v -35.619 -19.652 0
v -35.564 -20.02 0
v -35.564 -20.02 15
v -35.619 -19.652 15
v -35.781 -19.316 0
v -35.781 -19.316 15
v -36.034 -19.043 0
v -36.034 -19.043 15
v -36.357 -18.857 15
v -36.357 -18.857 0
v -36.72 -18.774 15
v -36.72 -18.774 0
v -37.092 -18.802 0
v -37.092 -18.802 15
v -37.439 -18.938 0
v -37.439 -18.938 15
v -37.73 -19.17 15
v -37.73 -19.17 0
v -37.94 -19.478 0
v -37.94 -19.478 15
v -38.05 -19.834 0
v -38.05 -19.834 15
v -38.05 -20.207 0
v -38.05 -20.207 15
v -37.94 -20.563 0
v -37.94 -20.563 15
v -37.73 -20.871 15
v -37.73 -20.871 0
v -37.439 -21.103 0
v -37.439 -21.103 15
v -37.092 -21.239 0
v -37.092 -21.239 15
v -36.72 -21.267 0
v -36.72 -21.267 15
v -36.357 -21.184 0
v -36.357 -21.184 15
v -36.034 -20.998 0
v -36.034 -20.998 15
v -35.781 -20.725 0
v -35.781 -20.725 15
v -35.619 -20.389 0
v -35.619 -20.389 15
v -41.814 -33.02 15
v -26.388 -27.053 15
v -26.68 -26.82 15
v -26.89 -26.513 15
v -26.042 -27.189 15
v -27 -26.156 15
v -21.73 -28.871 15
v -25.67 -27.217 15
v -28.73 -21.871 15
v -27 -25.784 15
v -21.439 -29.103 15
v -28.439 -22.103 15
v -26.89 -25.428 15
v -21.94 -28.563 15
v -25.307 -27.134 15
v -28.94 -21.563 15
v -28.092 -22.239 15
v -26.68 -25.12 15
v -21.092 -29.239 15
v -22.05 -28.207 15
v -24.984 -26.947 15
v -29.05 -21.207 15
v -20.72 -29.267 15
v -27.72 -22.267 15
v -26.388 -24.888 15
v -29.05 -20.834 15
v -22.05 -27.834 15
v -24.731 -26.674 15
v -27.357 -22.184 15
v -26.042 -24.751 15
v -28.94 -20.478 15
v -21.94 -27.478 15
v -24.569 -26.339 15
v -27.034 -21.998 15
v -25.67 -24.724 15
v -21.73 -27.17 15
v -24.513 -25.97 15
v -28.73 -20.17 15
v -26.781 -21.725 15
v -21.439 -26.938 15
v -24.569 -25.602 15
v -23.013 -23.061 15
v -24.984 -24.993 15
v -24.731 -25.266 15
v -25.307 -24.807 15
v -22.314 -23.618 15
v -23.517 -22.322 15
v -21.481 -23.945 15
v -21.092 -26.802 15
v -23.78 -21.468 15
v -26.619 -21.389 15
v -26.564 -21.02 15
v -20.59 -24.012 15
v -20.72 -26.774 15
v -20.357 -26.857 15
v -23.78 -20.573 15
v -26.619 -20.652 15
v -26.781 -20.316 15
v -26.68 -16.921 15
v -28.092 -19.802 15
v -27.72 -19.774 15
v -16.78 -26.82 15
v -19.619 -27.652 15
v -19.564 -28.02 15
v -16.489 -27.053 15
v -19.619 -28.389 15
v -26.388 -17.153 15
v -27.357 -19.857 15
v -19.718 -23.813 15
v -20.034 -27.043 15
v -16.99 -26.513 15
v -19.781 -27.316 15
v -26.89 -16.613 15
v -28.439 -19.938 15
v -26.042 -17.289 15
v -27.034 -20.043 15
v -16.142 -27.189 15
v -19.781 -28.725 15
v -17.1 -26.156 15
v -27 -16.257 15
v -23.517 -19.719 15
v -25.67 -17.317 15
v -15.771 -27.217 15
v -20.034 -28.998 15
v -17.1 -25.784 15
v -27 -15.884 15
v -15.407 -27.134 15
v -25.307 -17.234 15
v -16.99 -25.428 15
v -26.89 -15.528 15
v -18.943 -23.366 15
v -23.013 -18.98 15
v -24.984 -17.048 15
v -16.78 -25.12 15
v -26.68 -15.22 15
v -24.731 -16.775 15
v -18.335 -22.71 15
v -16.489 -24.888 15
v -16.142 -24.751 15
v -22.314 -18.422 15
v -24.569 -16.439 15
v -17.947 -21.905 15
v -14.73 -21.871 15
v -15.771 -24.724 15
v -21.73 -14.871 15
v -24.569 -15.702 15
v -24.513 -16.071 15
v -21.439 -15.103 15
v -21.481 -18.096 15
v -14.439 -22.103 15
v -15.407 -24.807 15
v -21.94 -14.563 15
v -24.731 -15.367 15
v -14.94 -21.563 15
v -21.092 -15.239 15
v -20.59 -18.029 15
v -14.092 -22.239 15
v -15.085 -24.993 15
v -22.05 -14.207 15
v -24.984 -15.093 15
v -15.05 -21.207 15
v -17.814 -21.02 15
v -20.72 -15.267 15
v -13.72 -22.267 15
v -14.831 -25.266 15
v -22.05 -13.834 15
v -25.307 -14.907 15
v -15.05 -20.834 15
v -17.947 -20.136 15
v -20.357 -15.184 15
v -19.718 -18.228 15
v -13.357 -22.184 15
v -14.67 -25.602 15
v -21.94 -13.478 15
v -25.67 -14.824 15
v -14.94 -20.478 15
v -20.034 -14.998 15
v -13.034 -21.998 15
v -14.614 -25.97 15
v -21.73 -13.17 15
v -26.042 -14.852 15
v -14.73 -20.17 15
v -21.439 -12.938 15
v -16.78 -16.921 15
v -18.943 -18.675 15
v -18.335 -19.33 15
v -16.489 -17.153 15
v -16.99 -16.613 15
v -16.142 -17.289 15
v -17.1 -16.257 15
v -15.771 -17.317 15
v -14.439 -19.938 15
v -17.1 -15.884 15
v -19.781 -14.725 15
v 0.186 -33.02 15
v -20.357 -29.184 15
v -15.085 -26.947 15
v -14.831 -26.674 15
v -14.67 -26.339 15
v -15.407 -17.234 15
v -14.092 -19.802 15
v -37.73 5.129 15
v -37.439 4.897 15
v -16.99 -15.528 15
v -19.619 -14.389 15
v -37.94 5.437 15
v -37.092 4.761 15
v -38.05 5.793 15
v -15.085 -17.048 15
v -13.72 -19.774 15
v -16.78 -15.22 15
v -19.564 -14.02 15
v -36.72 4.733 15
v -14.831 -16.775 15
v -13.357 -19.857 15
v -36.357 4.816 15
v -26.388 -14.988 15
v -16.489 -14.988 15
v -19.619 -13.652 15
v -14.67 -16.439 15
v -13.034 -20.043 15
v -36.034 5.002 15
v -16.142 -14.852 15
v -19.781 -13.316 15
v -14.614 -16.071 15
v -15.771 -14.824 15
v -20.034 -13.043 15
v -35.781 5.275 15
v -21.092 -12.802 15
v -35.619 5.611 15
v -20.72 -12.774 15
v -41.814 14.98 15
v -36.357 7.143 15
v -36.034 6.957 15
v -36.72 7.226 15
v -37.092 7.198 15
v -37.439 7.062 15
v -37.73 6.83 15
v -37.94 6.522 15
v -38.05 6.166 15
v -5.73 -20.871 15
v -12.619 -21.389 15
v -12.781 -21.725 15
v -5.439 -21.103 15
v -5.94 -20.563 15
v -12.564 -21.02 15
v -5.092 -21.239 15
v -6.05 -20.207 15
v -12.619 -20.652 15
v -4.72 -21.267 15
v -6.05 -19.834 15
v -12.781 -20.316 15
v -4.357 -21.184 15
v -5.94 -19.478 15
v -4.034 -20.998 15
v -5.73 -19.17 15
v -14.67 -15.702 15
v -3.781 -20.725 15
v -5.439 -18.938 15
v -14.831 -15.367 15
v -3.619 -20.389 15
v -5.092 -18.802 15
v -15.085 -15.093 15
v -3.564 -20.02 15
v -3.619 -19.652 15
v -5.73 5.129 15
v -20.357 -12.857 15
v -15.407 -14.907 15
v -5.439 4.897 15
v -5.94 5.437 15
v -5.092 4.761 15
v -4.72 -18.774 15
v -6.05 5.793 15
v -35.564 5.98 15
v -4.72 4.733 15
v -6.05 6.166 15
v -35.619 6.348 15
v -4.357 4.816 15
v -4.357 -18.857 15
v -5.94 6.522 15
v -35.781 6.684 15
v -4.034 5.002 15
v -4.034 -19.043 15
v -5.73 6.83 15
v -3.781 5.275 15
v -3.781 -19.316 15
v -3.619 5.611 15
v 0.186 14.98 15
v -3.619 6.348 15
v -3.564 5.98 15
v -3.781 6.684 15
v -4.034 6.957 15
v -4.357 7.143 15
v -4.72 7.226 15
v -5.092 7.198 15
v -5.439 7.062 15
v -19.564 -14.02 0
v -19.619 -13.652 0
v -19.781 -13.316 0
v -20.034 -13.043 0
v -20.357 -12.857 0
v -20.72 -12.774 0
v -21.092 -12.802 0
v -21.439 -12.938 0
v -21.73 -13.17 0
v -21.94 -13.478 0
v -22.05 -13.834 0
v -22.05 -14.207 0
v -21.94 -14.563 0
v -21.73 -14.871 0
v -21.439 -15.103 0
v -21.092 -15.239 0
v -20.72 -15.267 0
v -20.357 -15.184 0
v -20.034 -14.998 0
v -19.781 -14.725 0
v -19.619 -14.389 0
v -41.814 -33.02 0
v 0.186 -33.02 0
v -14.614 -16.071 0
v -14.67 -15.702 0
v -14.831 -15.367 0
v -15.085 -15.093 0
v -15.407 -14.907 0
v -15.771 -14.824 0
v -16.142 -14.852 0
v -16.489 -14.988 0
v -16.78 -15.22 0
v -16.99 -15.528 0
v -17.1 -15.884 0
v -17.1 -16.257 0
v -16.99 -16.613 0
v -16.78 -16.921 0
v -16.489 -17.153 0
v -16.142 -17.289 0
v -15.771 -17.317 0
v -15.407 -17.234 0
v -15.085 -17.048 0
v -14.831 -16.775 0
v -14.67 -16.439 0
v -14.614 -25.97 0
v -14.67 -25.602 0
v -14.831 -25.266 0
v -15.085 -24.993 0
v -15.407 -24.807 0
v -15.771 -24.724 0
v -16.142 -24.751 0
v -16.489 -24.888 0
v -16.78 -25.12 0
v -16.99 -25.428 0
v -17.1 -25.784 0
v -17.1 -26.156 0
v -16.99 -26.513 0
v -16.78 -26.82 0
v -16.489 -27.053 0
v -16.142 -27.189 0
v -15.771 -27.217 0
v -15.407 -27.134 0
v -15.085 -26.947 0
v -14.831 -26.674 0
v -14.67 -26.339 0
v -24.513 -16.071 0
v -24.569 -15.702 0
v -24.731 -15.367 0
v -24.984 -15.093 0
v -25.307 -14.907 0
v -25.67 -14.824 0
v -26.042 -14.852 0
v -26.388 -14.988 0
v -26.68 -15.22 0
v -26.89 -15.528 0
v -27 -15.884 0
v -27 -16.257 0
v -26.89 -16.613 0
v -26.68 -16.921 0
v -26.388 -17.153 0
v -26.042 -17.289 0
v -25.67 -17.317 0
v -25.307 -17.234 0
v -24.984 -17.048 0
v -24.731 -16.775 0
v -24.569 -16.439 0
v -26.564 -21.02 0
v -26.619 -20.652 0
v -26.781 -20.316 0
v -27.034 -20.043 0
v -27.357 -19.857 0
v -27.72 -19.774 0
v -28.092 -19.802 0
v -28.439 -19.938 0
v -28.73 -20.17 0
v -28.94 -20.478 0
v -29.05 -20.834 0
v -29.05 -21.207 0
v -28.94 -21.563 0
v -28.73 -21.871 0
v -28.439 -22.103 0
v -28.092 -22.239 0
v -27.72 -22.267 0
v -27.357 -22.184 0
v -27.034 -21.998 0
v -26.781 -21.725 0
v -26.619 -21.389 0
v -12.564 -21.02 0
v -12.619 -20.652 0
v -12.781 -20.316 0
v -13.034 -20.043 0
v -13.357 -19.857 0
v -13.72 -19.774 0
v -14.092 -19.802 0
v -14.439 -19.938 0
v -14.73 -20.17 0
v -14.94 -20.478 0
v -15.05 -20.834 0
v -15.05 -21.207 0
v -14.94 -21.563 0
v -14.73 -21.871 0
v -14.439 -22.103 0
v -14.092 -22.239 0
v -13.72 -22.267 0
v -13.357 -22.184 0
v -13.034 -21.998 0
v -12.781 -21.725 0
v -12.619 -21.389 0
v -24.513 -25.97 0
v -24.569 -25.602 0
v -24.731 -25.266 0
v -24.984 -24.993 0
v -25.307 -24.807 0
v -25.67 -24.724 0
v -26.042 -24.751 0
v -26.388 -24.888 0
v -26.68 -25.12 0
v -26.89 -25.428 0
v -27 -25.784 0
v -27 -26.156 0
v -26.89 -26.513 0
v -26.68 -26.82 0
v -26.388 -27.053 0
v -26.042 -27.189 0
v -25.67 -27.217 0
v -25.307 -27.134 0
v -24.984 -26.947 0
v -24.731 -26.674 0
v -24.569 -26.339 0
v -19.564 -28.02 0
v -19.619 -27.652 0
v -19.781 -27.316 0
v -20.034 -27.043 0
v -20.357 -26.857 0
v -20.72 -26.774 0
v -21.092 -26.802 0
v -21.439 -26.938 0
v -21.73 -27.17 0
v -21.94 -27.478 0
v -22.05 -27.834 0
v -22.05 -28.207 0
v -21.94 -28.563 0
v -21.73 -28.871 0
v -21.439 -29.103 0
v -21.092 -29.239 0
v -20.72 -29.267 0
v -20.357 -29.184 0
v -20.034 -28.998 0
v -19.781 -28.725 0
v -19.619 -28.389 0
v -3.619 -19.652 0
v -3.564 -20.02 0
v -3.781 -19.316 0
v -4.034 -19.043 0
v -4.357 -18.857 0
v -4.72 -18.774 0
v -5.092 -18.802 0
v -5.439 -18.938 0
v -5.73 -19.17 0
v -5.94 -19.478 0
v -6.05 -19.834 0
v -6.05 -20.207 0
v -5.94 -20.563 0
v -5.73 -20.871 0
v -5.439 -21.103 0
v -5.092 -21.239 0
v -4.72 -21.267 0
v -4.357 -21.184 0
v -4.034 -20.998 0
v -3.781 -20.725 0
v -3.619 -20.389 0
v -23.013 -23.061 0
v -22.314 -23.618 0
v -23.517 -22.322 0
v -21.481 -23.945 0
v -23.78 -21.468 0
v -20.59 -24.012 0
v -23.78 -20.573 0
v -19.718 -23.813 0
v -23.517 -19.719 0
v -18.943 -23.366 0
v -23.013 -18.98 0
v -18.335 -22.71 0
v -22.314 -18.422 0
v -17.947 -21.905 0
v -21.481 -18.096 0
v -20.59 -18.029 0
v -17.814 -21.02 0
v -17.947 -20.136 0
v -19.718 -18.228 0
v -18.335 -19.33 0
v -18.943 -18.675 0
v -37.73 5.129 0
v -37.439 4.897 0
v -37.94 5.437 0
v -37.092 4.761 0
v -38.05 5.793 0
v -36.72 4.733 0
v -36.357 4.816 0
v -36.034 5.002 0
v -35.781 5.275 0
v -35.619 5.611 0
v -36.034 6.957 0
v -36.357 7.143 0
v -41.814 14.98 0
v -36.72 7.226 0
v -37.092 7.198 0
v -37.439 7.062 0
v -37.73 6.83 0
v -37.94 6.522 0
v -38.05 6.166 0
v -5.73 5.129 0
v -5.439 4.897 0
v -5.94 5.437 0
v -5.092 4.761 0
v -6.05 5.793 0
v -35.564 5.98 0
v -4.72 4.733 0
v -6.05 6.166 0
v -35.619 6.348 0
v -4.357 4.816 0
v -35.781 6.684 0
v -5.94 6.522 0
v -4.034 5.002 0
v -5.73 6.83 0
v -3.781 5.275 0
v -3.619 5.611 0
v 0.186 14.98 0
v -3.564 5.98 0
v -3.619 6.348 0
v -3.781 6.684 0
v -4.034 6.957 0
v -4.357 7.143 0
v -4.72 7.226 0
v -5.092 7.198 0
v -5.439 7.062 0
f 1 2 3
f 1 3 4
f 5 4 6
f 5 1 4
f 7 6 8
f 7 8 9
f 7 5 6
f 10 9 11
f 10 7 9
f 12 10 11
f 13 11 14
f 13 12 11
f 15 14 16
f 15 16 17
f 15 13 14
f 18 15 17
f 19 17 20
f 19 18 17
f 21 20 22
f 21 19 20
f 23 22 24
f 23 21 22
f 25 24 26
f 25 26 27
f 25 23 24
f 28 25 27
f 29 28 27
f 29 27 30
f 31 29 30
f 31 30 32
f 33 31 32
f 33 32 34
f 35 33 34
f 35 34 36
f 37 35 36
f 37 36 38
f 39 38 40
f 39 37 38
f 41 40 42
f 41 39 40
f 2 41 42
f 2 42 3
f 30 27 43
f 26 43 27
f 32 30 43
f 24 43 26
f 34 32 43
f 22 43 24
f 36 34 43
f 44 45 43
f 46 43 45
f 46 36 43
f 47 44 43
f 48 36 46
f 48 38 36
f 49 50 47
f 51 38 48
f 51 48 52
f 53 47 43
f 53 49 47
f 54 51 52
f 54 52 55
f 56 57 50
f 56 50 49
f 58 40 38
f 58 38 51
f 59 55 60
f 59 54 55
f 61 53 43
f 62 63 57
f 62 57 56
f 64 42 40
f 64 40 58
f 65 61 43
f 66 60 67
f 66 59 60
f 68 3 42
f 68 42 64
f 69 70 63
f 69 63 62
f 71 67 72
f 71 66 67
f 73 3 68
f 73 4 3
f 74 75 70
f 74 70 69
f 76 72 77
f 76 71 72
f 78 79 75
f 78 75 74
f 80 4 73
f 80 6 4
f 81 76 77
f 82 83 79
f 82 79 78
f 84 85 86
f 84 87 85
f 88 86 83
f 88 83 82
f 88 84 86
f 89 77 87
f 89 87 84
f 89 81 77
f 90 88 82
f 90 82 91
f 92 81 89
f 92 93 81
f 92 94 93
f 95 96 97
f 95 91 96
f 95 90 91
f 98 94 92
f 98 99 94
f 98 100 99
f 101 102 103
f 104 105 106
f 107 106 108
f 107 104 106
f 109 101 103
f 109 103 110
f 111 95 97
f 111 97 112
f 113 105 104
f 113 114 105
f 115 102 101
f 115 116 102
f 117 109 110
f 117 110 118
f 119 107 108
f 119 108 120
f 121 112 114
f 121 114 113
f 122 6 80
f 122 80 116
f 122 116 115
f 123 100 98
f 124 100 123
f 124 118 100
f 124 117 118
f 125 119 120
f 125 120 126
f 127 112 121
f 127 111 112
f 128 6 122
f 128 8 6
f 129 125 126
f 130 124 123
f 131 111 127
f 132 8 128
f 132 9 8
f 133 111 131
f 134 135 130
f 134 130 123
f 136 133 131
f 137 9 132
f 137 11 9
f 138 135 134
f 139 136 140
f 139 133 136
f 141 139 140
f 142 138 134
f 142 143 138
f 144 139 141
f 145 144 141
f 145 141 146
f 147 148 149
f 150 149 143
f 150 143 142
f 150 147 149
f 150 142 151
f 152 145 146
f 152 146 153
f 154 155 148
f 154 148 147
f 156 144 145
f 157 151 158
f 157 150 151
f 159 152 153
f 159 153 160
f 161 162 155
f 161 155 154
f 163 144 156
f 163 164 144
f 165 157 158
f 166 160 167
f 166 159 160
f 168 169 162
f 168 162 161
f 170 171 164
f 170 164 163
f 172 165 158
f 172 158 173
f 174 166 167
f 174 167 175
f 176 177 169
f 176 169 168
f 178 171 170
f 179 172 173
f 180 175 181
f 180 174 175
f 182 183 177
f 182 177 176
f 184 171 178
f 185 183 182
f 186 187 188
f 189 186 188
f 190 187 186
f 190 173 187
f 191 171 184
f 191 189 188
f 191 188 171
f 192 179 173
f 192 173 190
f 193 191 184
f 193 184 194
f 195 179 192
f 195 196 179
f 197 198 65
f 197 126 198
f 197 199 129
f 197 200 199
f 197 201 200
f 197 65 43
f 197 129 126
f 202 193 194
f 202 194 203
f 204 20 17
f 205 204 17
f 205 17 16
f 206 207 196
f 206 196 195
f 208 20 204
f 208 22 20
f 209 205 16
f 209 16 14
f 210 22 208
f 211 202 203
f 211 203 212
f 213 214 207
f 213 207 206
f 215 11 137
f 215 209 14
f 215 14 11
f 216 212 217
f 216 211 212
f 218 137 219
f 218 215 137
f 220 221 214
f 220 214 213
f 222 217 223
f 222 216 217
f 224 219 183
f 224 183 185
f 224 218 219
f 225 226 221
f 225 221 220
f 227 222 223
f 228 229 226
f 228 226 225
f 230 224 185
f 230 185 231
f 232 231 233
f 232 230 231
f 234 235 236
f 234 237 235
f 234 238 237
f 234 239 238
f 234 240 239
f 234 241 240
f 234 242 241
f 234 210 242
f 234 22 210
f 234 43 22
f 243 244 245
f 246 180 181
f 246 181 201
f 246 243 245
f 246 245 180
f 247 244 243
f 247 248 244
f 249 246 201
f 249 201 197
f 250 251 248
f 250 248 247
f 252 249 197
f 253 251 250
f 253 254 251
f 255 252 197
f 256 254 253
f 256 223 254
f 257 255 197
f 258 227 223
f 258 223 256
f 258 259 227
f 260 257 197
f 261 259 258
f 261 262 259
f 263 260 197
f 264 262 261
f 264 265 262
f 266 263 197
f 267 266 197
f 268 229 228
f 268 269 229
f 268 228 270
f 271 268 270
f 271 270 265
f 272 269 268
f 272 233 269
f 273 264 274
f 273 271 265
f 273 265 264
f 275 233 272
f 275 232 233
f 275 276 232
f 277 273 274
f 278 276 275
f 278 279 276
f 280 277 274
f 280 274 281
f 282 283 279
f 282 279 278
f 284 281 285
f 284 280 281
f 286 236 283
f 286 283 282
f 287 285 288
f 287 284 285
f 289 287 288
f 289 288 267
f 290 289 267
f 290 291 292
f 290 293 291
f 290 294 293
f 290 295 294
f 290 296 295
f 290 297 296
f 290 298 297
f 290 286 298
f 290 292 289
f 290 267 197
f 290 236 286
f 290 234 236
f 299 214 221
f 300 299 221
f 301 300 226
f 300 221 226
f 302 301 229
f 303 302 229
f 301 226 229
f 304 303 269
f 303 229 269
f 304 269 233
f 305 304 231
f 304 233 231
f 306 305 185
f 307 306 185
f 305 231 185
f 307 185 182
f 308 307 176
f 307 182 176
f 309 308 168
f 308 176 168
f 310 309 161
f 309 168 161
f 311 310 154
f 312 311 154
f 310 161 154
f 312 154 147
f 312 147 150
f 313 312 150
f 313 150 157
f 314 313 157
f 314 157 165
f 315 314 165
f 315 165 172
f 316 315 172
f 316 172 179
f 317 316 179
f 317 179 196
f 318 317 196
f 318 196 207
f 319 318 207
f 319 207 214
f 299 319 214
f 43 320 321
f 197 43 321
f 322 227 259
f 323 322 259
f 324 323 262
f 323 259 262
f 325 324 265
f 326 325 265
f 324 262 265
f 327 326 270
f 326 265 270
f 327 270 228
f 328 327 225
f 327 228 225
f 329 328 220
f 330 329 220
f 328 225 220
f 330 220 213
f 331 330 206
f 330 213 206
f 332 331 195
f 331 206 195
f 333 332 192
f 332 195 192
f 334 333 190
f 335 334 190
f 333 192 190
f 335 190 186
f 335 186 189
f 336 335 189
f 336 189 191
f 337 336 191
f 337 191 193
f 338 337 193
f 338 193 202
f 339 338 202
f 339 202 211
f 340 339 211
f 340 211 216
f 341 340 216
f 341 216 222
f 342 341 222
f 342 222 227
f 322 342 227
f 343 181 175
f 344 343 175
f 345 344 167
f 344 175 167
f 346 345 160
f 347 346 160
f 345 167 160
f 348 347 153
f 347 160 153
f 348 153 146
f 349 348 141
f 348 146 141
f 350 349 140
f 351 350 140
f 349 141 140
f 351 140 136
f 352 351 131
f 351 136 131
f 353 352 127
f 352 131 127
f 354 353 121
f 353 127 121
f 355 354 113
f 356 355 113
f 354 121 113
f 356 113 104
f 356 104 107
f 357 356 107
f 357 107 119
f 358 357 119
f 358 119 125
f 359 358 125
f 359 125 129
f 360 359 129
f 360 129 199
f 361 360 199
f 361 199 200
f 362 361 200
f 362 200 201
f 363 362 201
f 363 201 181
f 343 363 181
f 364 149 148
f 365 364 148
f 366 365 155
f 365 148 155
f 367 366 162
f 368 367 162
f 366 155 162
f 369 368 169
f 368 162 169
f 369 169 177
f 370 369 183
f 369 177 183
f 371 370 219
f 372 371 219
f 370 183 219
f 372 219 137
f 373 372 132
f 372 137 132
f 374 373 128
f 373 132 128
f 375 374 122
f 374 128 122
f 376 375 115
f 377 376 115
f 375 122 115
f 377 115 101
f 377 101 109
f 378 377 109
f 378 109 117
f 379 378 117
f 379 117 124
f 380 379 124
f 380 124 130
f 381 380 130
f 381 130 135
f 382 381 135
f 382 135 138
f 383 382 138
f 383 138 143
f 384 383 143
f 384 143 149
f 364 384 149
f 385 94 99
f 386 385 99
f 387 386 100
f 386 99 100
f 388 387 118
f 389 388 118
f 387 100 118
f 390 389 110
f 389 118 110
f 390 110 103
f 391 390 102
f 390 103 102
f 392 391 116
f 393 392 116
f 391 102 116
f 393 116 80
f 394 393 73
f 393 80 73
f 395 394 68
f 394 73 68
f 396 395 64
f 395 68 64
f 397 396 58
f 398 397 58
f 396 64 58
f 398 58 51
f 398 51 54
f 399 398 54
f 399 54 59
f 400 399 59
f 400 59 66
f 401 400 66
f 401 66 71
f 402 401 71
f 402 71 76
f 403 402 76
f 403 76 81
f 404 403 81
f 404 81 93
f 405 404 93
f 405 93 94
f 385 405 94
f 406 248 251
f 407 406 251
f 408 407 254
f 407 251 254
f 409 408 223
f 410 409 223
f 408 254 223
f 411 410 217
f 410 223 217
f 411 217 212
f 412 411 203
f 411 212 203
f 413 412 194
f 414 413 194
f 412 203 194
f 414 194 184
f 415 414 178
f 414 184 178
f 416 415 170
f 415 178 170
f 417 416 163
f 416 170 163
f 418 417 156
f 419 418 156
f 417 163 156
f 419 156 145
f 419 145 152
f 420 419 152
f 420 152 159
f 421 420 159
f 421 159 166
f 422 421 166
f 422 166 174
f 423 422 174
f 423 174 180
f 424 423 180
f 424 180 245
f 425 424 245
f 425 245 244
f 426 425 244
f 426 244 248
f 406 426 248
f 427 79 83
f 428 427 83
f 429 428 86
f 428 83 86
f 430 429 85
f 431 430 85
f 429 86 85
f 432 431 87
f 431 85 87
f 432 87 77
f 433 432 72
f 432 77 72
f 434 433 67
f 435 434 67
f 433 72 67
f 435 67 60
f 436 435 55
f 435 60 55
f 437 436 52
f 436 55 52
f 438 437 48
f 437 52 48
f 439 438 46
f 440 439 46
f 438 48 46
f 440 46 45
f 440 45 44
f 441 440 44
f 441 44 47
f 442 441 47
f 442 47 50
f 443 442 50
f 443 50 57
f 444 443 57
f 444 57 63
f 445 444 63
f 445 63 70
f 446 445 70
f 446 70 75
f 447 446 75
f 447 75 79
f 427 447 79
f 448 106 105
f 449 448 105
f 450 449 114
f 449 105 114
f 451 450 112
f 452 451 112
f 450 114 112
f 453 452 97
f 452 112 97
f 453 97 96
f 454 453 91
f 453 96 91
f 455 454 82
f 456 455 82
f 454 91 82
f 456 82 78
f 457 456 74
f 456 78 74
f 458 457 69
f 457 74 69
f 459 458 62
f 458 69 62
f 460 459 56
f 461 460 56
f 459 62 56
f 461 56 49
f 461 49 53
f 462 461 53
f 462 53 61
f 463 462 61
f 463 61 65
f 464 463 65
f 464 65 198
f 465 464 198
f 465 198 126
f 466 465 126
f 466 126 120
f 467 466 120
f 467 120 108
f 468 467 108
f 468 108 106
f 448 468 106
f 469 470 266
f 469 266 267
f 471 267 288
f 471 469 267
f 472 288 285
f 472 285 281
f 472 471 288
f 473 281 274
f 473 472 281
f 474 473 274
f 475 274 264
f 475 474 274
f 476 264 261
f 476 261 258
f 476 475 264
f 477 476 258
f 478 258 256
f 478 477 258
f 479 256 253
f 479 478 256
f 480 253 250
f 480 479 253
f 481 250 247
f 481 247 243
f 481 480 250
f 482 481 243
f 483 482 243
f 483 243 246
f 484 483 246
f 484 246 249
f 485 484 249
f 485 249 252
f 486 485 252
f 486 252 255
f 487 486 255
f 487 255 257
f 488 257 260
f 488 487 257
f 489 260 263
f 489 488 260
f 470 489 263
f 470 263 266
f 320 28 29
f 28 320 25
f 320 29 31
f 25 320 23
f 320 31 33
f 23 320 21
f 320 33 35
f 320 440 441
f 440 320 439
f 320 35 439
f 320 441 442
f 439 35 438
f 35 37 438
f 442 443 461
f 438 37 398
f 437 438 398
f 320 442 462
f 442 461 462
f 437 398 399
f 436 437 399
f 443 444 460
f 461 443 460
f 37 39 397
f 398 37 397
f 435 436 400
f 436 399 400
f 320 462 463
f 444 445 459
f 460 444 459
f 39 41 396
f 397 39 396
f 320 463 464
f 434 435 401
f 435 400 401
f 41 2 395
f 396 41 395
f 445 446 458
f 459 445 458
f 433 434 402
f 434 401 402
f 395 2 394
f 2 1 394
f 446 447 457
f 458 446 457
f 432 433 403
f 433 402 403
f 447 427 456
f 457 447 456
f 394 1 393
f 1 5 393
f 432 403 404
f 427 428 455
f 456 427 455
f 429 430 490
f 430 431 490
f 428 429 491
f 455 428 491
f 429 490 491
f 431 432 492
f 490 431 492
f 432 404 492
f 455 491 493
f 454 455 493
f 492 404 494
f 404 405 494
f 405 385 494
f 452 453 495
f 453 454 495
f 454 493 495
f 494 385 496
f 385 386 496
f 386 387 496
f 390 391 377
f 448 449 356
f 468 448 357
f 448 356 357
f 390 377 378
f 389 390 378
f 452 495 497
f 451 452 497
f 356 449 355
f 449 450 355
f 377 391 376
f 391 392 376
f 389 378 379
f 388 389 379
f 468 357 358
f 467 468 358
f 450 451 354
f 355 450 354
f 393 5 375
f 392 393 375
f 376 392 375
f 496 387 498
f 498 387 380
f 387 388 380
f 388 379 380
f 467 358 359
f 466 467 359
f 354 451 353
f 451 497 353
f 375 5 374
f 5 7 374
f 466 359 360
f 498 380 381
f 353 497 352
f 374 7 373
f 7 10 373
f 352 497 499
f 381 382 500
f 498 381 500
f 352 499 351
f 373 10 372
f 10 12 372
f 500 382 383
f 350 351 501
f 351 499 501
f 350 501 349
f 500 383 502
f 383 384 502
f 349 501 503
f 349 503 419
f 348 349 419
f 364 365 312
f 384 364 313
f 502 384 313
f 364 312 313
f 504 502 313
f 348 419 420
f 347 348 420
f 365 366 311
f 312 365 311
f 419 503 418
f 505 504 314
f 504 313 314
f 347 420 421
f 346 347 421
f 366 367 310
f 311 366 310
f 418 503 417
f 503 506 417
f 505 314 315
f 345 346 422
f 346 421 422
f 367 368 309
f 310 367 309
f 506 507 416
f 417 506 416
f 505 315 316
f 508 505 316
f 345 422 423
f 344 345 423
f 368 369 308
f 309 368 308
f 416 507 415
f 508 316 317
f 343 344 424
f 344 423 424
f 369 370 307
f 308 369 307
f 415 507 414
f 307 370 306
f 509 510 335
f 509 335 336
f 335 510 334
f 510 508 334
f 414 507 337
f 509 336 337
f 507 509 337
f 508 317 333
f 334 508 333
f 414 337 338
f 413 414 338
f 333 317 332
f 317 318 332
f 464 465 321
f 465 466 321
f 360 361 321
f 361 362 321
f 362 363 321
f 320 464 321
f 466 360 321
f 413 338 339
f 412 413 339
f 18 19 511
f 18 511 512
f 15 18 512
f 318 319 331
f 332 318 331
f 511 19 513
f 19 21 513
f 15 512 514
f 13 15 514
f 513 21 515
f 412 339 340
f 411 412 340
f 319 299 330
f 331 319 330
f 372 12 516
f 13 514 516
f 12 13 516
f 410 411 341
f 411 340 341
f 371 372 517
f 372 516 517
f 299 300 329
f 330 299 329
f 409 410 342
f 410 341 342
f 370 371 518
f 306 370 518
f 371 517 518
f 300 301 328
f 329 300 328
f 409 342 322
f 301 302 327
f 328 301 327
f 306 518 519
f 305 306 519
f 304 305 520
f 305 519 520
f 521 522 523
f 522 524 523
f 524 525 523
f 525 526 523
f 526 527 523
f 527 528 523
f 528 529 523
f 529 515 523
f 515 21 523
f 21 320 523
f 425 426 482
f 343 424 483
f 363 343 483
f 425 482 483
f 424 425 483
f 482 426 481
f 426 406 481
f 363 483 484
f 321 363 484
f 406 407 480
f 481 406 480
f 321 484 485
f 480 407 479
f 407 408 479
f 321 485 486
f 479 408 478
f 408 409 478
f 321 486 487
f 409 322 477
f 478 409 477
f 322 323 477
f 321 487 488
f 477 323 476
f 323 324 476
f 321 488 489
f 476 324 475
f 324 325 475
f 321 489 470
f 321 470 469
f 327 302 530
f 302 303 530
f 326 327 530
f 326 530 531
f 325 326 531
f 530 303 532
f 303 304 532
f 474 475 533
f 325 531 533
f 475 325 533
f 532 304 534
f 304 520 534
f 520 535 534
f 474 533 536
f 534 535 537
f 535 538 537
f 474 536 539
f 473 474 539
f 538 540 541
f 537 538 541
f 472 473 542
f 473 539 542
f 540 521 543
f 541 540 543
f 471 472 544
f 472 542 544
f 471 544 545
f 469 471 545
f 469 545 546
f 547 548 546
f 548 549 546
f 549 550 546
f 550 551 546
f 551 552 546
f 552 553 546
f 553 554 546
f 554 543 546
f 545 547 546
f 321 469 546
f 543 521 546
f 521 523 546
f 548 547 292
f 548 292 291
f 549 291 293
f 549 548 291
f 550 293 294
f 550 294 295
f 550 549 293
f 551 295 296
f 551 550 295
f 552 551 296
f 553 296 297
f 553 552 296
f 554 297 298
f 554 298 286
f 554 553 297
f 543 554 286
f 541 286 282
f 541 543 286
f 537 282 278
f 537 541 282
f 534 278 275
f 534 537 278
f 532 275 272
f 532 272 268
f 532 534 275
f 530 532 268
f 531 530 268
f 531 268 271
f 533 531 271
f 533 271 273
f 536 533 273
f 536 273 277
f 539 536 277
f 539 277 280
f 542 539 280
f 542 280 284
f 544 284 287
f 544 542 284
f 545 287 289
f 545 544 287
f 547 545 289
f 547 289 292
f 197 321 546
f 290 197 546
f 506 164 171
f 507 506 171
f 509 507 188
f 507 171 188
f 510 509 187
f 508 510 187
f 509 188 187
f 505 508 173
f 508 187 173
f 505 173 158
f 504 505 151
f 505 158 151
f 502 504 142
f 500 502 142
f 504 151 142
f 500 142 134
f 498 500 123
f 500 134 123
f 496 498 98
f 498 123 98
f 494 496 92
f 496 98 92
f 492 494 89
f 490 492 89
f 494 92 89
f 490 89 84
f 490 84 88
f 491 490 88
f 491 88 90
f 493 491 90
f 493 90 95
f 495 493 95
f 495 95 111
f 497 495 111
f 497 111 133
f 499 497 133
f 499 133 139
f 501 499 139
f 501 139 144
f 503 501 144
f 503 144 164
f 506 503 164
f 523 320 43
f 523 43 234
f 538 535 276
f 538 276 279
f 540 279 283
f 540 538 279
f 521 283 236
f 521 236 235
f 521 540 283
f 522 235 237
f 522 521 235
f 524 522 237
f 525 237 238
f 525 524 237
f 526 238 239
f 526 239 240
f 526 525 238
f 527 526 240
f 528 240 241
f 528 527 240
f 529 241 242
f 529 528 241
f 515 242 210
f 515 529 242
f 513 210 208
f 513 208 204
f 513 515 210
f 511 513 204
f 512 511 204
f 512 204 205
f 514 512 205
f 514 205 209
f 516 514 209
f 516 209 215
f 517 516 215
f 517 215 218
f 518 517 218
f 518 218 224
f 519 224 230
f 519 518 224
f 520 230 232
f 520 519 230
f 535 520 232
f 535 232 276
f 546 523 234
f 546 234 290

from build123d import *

# Parameters (mm, degrees)
SKETCH_1_W          = 42
SKETCH_1_H          = 48
SKETCH_1_R          = 1.25
EXTRUDE_1_DEPTH     = 15
SKETCH_2_R          = 3
SKETCH_2_R_2        = 1.25
CUT_EXTRUDE_1_DEPTH = 20


with BuildPart() as part:
    # 草圖1 → 填料-伸長1 (new body)
    with BuildSketch(Plane.XY):
        with Locations((-20.813738939, -9.020397992)):
            Rectangle(SKETCH_1_W, SKETCH_1_H)
        with Locations((-36.813738939, 5.979602008)):
            Circle(SKETCH_1_R, mode=Mode.SUBTRACT)
        with Locations((-36.813738939, -20.020397992)):
            Circle(SKETCH_1_R, mode=Mode.SUBTRACT)
        with Locations((-4.813738939, -20.020397992)):
            Circle(SKETCH_1_R, mode=Mode.SUBTRACT)
        with Locations((-4.813738939, 5.979602008)):
            Circle(SKETCH_1_R, mode=Mode.SUBTRACT)
    extrude(amount=EXTRUDE_1_DEPTH)

    # 草圖2 → 除料-伸長1 (cut)
    with BuildSketch(Plane.XY.offset(15)):
        with Locations((-20.813738939, -21.020397992)):
            Circle(SKETCH_2_R)
        with Locations((-20.813738939, -14.020397992)):
            Circle(SKETCH_2_R_2)
        with Locations((-25.763486407, -16.070650524)):
            Circle(SKETCH_2_R_2)
        with Locations((-27.813738939, -21.020397992)):
            Circle(SKETCH_2_R_2)
        with Locations((-25.763486407, -25.970145461)):
            Circle(SKETCH_2_R_2)
        with Locations((-20.813738939, -28.020397992)):
            Circle(SKETCH_2_R_2)
        with Locations((-15.86399147, -25.970145461)):
            Circle(SKETCH_2_R_2)
        with Locations((-13.813738939, -21.020397992)):
            Circle(SKETCH_2_R_2)
        with Locations((-15.86399147, -16.070650524)):
            Circle(SKETCH_2_R_2)
    extrude(amount=-CUT_EXTRUDE_1_DEPTH, mode=Mode.SUBTRACT)


solid = part.part
